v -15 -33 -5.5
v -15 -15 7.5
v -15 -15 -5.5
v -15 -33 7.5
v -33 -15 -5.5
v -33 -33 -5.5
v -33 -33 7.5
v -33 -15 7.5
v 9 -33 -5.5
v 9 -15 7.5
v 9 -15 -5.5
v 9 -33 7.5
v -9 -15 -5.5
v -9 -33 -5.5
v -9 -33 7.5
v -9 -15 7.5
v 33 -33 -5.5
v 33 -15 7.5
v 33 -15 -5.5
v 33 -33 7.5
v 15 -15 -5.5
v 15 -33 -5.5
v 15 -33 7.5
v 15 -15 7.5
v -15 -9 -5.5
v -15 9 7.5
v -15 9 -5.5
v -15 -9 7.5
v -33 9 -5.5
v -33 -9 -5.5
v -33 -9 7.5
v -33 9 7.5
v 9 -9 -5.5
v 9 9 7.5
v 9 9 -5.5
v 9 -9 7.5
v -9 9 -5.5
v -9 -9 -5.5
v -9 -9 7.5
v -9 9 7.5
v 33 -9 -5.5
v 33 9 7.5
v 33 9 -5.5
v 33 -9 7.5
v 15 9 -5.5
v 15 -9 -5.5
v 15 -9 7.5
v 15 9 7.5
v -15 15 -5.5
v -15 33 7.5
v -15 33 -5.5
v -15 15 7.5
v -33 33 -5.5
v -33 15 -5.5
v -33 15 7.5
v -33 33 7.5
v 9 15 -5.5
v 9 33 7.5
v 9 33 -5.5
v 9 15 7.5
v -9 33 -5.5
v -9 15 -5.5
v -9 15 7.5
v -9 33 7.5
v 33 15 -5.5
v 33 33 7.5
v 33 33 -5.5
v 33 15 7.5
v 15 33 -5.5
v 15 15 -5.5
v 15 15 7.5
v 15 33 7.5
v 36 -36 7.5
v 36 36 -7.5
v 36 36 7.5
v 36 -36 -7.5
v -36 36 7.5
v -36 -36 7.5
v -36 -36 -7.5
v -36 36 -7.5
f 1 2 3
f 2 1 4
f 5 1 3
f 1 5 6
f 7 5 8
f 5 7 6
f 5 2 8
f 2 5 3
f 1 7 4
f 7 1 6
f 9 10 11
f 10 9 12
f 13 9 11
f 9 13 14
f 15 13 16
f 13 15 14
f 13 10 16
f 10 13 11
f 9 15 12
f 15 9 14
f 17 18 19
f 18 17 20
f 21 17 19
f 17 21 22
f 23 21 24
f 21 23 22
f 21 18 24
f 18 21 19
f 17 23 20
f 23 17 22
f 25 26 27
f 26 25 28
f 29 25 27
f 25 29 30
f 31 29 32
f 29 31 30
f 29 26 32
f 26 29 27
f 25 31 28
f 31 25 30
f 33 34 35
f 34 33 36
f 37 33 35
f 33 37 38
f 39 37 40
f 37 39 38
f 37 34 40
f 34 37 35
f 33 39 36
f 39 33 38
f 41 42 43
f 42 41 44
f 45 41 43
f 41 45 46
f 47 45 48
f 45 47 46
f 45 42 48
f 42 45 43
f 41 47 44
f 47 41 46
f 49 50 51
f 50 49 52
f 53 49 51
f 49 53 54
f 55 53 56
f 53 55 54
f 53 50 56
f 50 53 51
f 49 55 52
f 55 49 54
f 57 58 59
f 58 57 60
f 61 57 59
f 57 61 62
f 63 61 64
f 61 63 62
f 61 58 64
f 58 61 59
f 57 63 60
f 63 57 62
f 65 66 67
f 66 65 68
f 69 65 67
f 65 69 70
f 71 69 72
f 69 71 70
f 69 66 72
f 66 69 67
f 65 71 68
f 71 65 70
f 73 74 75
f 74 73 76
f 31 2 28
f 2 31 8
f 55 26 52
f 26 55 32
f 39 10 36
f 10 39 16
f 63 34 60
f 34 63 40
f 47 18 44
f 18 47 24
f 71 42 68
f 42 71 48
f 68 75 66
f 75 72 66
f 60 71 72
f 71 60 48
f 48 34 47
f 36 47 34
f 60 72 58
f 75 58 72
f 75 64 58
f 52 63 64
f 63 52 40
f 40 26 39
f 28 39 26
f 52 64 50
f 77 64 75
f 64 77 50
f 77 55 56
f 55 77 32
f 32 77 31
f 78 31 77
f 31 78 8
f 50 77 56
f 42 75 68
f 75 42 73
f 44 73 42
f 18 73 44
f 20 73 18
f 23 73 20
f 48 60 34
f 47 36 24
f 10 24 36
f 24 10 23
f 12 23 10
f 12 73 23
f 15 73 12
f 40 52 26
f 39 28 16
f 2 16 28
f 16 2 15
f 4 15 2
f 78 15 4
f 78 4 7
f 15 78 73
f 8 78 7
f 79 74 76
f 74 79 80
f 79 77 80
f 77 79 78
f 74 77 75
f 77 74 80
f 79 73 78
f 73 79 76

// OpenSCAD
$fn = 32;

// ----------------------------------------------------------------------
// Pocket plate 72 x 72 x 15
// 3 x 3 pockets 18 mm square, 13 mm deep
// ----------------------------------------------------------------------

// --- parameters (mm) ---
thickness = 15;  // plate thickness
floor_t = 2;     // material left under each pocket
pocket = 18;     // pocket side length
pitch_x = 24;    // pocket pitch along X
pitch_y = 24;    // pocket pitch along Y
cols = 3;        // pockets per row
rows = 3;        // rows of pockets

// --- derived feature positions (mm) ---
depth = thickness - floor_t;        // = 13   pocket depth, down to the floor
span_x = (cols - 1) * pitch_x;      // = 48   distance between outer pockets
span_y = (rows - 1) * pitch_y;      // = 48   distance between outer pocket rows
origin_x = -span_x / 2;             // = -24   X of the first pocket
origin_y = -span_y / 2;             // = -24   Y of the first pocket
plate = [span_x + pocket + 6, span_y + pocket + 6, thickness];  // = [72, 72, 15]   overall size: pockets plus 3 mm of wall on each side
feature_centers = [
  [origin_x + 0 * pitch_x, origin_y + 0 * pitch_y],
  [origin_x + 1 * pitch_x, origin_y + 0 * pitch_y],
  [origin_x + 2 * pitch_x, origin_y + 0 * pitch_y],
  [origin_x + 0 * pitch_x, origin_y + 1 * pitch_y],
  [origin_x + 1 * pitch_x, origin_y + 1 * pitch_y],
  [origin_x + 2 * pitch_x, origin_y + 1 * pitch_y],
  [origin_x + 0 * pitch_x, origin_y + 2 * pitch_y],
  [origin_x + 1 * pitch_x, origin_y + 2 * pitch_y],
  [origin_x + 2 * pitch_x, origin_y + 2 * pitch_y]
];   // pocket centres, used verbatim by the cutter loop

// plate outline, then one pocket per centre in feature_centers
difference() {
  cube(plate, center = true);
  for (centre = feature_centers)
    translate([centre[0] - pocket / 2, centre[1] - pocket / 2, plate[2] / 2 - depth])
      cube([pocket, pocket, depth + 1]);  // centred on the declared pocket centre
}
